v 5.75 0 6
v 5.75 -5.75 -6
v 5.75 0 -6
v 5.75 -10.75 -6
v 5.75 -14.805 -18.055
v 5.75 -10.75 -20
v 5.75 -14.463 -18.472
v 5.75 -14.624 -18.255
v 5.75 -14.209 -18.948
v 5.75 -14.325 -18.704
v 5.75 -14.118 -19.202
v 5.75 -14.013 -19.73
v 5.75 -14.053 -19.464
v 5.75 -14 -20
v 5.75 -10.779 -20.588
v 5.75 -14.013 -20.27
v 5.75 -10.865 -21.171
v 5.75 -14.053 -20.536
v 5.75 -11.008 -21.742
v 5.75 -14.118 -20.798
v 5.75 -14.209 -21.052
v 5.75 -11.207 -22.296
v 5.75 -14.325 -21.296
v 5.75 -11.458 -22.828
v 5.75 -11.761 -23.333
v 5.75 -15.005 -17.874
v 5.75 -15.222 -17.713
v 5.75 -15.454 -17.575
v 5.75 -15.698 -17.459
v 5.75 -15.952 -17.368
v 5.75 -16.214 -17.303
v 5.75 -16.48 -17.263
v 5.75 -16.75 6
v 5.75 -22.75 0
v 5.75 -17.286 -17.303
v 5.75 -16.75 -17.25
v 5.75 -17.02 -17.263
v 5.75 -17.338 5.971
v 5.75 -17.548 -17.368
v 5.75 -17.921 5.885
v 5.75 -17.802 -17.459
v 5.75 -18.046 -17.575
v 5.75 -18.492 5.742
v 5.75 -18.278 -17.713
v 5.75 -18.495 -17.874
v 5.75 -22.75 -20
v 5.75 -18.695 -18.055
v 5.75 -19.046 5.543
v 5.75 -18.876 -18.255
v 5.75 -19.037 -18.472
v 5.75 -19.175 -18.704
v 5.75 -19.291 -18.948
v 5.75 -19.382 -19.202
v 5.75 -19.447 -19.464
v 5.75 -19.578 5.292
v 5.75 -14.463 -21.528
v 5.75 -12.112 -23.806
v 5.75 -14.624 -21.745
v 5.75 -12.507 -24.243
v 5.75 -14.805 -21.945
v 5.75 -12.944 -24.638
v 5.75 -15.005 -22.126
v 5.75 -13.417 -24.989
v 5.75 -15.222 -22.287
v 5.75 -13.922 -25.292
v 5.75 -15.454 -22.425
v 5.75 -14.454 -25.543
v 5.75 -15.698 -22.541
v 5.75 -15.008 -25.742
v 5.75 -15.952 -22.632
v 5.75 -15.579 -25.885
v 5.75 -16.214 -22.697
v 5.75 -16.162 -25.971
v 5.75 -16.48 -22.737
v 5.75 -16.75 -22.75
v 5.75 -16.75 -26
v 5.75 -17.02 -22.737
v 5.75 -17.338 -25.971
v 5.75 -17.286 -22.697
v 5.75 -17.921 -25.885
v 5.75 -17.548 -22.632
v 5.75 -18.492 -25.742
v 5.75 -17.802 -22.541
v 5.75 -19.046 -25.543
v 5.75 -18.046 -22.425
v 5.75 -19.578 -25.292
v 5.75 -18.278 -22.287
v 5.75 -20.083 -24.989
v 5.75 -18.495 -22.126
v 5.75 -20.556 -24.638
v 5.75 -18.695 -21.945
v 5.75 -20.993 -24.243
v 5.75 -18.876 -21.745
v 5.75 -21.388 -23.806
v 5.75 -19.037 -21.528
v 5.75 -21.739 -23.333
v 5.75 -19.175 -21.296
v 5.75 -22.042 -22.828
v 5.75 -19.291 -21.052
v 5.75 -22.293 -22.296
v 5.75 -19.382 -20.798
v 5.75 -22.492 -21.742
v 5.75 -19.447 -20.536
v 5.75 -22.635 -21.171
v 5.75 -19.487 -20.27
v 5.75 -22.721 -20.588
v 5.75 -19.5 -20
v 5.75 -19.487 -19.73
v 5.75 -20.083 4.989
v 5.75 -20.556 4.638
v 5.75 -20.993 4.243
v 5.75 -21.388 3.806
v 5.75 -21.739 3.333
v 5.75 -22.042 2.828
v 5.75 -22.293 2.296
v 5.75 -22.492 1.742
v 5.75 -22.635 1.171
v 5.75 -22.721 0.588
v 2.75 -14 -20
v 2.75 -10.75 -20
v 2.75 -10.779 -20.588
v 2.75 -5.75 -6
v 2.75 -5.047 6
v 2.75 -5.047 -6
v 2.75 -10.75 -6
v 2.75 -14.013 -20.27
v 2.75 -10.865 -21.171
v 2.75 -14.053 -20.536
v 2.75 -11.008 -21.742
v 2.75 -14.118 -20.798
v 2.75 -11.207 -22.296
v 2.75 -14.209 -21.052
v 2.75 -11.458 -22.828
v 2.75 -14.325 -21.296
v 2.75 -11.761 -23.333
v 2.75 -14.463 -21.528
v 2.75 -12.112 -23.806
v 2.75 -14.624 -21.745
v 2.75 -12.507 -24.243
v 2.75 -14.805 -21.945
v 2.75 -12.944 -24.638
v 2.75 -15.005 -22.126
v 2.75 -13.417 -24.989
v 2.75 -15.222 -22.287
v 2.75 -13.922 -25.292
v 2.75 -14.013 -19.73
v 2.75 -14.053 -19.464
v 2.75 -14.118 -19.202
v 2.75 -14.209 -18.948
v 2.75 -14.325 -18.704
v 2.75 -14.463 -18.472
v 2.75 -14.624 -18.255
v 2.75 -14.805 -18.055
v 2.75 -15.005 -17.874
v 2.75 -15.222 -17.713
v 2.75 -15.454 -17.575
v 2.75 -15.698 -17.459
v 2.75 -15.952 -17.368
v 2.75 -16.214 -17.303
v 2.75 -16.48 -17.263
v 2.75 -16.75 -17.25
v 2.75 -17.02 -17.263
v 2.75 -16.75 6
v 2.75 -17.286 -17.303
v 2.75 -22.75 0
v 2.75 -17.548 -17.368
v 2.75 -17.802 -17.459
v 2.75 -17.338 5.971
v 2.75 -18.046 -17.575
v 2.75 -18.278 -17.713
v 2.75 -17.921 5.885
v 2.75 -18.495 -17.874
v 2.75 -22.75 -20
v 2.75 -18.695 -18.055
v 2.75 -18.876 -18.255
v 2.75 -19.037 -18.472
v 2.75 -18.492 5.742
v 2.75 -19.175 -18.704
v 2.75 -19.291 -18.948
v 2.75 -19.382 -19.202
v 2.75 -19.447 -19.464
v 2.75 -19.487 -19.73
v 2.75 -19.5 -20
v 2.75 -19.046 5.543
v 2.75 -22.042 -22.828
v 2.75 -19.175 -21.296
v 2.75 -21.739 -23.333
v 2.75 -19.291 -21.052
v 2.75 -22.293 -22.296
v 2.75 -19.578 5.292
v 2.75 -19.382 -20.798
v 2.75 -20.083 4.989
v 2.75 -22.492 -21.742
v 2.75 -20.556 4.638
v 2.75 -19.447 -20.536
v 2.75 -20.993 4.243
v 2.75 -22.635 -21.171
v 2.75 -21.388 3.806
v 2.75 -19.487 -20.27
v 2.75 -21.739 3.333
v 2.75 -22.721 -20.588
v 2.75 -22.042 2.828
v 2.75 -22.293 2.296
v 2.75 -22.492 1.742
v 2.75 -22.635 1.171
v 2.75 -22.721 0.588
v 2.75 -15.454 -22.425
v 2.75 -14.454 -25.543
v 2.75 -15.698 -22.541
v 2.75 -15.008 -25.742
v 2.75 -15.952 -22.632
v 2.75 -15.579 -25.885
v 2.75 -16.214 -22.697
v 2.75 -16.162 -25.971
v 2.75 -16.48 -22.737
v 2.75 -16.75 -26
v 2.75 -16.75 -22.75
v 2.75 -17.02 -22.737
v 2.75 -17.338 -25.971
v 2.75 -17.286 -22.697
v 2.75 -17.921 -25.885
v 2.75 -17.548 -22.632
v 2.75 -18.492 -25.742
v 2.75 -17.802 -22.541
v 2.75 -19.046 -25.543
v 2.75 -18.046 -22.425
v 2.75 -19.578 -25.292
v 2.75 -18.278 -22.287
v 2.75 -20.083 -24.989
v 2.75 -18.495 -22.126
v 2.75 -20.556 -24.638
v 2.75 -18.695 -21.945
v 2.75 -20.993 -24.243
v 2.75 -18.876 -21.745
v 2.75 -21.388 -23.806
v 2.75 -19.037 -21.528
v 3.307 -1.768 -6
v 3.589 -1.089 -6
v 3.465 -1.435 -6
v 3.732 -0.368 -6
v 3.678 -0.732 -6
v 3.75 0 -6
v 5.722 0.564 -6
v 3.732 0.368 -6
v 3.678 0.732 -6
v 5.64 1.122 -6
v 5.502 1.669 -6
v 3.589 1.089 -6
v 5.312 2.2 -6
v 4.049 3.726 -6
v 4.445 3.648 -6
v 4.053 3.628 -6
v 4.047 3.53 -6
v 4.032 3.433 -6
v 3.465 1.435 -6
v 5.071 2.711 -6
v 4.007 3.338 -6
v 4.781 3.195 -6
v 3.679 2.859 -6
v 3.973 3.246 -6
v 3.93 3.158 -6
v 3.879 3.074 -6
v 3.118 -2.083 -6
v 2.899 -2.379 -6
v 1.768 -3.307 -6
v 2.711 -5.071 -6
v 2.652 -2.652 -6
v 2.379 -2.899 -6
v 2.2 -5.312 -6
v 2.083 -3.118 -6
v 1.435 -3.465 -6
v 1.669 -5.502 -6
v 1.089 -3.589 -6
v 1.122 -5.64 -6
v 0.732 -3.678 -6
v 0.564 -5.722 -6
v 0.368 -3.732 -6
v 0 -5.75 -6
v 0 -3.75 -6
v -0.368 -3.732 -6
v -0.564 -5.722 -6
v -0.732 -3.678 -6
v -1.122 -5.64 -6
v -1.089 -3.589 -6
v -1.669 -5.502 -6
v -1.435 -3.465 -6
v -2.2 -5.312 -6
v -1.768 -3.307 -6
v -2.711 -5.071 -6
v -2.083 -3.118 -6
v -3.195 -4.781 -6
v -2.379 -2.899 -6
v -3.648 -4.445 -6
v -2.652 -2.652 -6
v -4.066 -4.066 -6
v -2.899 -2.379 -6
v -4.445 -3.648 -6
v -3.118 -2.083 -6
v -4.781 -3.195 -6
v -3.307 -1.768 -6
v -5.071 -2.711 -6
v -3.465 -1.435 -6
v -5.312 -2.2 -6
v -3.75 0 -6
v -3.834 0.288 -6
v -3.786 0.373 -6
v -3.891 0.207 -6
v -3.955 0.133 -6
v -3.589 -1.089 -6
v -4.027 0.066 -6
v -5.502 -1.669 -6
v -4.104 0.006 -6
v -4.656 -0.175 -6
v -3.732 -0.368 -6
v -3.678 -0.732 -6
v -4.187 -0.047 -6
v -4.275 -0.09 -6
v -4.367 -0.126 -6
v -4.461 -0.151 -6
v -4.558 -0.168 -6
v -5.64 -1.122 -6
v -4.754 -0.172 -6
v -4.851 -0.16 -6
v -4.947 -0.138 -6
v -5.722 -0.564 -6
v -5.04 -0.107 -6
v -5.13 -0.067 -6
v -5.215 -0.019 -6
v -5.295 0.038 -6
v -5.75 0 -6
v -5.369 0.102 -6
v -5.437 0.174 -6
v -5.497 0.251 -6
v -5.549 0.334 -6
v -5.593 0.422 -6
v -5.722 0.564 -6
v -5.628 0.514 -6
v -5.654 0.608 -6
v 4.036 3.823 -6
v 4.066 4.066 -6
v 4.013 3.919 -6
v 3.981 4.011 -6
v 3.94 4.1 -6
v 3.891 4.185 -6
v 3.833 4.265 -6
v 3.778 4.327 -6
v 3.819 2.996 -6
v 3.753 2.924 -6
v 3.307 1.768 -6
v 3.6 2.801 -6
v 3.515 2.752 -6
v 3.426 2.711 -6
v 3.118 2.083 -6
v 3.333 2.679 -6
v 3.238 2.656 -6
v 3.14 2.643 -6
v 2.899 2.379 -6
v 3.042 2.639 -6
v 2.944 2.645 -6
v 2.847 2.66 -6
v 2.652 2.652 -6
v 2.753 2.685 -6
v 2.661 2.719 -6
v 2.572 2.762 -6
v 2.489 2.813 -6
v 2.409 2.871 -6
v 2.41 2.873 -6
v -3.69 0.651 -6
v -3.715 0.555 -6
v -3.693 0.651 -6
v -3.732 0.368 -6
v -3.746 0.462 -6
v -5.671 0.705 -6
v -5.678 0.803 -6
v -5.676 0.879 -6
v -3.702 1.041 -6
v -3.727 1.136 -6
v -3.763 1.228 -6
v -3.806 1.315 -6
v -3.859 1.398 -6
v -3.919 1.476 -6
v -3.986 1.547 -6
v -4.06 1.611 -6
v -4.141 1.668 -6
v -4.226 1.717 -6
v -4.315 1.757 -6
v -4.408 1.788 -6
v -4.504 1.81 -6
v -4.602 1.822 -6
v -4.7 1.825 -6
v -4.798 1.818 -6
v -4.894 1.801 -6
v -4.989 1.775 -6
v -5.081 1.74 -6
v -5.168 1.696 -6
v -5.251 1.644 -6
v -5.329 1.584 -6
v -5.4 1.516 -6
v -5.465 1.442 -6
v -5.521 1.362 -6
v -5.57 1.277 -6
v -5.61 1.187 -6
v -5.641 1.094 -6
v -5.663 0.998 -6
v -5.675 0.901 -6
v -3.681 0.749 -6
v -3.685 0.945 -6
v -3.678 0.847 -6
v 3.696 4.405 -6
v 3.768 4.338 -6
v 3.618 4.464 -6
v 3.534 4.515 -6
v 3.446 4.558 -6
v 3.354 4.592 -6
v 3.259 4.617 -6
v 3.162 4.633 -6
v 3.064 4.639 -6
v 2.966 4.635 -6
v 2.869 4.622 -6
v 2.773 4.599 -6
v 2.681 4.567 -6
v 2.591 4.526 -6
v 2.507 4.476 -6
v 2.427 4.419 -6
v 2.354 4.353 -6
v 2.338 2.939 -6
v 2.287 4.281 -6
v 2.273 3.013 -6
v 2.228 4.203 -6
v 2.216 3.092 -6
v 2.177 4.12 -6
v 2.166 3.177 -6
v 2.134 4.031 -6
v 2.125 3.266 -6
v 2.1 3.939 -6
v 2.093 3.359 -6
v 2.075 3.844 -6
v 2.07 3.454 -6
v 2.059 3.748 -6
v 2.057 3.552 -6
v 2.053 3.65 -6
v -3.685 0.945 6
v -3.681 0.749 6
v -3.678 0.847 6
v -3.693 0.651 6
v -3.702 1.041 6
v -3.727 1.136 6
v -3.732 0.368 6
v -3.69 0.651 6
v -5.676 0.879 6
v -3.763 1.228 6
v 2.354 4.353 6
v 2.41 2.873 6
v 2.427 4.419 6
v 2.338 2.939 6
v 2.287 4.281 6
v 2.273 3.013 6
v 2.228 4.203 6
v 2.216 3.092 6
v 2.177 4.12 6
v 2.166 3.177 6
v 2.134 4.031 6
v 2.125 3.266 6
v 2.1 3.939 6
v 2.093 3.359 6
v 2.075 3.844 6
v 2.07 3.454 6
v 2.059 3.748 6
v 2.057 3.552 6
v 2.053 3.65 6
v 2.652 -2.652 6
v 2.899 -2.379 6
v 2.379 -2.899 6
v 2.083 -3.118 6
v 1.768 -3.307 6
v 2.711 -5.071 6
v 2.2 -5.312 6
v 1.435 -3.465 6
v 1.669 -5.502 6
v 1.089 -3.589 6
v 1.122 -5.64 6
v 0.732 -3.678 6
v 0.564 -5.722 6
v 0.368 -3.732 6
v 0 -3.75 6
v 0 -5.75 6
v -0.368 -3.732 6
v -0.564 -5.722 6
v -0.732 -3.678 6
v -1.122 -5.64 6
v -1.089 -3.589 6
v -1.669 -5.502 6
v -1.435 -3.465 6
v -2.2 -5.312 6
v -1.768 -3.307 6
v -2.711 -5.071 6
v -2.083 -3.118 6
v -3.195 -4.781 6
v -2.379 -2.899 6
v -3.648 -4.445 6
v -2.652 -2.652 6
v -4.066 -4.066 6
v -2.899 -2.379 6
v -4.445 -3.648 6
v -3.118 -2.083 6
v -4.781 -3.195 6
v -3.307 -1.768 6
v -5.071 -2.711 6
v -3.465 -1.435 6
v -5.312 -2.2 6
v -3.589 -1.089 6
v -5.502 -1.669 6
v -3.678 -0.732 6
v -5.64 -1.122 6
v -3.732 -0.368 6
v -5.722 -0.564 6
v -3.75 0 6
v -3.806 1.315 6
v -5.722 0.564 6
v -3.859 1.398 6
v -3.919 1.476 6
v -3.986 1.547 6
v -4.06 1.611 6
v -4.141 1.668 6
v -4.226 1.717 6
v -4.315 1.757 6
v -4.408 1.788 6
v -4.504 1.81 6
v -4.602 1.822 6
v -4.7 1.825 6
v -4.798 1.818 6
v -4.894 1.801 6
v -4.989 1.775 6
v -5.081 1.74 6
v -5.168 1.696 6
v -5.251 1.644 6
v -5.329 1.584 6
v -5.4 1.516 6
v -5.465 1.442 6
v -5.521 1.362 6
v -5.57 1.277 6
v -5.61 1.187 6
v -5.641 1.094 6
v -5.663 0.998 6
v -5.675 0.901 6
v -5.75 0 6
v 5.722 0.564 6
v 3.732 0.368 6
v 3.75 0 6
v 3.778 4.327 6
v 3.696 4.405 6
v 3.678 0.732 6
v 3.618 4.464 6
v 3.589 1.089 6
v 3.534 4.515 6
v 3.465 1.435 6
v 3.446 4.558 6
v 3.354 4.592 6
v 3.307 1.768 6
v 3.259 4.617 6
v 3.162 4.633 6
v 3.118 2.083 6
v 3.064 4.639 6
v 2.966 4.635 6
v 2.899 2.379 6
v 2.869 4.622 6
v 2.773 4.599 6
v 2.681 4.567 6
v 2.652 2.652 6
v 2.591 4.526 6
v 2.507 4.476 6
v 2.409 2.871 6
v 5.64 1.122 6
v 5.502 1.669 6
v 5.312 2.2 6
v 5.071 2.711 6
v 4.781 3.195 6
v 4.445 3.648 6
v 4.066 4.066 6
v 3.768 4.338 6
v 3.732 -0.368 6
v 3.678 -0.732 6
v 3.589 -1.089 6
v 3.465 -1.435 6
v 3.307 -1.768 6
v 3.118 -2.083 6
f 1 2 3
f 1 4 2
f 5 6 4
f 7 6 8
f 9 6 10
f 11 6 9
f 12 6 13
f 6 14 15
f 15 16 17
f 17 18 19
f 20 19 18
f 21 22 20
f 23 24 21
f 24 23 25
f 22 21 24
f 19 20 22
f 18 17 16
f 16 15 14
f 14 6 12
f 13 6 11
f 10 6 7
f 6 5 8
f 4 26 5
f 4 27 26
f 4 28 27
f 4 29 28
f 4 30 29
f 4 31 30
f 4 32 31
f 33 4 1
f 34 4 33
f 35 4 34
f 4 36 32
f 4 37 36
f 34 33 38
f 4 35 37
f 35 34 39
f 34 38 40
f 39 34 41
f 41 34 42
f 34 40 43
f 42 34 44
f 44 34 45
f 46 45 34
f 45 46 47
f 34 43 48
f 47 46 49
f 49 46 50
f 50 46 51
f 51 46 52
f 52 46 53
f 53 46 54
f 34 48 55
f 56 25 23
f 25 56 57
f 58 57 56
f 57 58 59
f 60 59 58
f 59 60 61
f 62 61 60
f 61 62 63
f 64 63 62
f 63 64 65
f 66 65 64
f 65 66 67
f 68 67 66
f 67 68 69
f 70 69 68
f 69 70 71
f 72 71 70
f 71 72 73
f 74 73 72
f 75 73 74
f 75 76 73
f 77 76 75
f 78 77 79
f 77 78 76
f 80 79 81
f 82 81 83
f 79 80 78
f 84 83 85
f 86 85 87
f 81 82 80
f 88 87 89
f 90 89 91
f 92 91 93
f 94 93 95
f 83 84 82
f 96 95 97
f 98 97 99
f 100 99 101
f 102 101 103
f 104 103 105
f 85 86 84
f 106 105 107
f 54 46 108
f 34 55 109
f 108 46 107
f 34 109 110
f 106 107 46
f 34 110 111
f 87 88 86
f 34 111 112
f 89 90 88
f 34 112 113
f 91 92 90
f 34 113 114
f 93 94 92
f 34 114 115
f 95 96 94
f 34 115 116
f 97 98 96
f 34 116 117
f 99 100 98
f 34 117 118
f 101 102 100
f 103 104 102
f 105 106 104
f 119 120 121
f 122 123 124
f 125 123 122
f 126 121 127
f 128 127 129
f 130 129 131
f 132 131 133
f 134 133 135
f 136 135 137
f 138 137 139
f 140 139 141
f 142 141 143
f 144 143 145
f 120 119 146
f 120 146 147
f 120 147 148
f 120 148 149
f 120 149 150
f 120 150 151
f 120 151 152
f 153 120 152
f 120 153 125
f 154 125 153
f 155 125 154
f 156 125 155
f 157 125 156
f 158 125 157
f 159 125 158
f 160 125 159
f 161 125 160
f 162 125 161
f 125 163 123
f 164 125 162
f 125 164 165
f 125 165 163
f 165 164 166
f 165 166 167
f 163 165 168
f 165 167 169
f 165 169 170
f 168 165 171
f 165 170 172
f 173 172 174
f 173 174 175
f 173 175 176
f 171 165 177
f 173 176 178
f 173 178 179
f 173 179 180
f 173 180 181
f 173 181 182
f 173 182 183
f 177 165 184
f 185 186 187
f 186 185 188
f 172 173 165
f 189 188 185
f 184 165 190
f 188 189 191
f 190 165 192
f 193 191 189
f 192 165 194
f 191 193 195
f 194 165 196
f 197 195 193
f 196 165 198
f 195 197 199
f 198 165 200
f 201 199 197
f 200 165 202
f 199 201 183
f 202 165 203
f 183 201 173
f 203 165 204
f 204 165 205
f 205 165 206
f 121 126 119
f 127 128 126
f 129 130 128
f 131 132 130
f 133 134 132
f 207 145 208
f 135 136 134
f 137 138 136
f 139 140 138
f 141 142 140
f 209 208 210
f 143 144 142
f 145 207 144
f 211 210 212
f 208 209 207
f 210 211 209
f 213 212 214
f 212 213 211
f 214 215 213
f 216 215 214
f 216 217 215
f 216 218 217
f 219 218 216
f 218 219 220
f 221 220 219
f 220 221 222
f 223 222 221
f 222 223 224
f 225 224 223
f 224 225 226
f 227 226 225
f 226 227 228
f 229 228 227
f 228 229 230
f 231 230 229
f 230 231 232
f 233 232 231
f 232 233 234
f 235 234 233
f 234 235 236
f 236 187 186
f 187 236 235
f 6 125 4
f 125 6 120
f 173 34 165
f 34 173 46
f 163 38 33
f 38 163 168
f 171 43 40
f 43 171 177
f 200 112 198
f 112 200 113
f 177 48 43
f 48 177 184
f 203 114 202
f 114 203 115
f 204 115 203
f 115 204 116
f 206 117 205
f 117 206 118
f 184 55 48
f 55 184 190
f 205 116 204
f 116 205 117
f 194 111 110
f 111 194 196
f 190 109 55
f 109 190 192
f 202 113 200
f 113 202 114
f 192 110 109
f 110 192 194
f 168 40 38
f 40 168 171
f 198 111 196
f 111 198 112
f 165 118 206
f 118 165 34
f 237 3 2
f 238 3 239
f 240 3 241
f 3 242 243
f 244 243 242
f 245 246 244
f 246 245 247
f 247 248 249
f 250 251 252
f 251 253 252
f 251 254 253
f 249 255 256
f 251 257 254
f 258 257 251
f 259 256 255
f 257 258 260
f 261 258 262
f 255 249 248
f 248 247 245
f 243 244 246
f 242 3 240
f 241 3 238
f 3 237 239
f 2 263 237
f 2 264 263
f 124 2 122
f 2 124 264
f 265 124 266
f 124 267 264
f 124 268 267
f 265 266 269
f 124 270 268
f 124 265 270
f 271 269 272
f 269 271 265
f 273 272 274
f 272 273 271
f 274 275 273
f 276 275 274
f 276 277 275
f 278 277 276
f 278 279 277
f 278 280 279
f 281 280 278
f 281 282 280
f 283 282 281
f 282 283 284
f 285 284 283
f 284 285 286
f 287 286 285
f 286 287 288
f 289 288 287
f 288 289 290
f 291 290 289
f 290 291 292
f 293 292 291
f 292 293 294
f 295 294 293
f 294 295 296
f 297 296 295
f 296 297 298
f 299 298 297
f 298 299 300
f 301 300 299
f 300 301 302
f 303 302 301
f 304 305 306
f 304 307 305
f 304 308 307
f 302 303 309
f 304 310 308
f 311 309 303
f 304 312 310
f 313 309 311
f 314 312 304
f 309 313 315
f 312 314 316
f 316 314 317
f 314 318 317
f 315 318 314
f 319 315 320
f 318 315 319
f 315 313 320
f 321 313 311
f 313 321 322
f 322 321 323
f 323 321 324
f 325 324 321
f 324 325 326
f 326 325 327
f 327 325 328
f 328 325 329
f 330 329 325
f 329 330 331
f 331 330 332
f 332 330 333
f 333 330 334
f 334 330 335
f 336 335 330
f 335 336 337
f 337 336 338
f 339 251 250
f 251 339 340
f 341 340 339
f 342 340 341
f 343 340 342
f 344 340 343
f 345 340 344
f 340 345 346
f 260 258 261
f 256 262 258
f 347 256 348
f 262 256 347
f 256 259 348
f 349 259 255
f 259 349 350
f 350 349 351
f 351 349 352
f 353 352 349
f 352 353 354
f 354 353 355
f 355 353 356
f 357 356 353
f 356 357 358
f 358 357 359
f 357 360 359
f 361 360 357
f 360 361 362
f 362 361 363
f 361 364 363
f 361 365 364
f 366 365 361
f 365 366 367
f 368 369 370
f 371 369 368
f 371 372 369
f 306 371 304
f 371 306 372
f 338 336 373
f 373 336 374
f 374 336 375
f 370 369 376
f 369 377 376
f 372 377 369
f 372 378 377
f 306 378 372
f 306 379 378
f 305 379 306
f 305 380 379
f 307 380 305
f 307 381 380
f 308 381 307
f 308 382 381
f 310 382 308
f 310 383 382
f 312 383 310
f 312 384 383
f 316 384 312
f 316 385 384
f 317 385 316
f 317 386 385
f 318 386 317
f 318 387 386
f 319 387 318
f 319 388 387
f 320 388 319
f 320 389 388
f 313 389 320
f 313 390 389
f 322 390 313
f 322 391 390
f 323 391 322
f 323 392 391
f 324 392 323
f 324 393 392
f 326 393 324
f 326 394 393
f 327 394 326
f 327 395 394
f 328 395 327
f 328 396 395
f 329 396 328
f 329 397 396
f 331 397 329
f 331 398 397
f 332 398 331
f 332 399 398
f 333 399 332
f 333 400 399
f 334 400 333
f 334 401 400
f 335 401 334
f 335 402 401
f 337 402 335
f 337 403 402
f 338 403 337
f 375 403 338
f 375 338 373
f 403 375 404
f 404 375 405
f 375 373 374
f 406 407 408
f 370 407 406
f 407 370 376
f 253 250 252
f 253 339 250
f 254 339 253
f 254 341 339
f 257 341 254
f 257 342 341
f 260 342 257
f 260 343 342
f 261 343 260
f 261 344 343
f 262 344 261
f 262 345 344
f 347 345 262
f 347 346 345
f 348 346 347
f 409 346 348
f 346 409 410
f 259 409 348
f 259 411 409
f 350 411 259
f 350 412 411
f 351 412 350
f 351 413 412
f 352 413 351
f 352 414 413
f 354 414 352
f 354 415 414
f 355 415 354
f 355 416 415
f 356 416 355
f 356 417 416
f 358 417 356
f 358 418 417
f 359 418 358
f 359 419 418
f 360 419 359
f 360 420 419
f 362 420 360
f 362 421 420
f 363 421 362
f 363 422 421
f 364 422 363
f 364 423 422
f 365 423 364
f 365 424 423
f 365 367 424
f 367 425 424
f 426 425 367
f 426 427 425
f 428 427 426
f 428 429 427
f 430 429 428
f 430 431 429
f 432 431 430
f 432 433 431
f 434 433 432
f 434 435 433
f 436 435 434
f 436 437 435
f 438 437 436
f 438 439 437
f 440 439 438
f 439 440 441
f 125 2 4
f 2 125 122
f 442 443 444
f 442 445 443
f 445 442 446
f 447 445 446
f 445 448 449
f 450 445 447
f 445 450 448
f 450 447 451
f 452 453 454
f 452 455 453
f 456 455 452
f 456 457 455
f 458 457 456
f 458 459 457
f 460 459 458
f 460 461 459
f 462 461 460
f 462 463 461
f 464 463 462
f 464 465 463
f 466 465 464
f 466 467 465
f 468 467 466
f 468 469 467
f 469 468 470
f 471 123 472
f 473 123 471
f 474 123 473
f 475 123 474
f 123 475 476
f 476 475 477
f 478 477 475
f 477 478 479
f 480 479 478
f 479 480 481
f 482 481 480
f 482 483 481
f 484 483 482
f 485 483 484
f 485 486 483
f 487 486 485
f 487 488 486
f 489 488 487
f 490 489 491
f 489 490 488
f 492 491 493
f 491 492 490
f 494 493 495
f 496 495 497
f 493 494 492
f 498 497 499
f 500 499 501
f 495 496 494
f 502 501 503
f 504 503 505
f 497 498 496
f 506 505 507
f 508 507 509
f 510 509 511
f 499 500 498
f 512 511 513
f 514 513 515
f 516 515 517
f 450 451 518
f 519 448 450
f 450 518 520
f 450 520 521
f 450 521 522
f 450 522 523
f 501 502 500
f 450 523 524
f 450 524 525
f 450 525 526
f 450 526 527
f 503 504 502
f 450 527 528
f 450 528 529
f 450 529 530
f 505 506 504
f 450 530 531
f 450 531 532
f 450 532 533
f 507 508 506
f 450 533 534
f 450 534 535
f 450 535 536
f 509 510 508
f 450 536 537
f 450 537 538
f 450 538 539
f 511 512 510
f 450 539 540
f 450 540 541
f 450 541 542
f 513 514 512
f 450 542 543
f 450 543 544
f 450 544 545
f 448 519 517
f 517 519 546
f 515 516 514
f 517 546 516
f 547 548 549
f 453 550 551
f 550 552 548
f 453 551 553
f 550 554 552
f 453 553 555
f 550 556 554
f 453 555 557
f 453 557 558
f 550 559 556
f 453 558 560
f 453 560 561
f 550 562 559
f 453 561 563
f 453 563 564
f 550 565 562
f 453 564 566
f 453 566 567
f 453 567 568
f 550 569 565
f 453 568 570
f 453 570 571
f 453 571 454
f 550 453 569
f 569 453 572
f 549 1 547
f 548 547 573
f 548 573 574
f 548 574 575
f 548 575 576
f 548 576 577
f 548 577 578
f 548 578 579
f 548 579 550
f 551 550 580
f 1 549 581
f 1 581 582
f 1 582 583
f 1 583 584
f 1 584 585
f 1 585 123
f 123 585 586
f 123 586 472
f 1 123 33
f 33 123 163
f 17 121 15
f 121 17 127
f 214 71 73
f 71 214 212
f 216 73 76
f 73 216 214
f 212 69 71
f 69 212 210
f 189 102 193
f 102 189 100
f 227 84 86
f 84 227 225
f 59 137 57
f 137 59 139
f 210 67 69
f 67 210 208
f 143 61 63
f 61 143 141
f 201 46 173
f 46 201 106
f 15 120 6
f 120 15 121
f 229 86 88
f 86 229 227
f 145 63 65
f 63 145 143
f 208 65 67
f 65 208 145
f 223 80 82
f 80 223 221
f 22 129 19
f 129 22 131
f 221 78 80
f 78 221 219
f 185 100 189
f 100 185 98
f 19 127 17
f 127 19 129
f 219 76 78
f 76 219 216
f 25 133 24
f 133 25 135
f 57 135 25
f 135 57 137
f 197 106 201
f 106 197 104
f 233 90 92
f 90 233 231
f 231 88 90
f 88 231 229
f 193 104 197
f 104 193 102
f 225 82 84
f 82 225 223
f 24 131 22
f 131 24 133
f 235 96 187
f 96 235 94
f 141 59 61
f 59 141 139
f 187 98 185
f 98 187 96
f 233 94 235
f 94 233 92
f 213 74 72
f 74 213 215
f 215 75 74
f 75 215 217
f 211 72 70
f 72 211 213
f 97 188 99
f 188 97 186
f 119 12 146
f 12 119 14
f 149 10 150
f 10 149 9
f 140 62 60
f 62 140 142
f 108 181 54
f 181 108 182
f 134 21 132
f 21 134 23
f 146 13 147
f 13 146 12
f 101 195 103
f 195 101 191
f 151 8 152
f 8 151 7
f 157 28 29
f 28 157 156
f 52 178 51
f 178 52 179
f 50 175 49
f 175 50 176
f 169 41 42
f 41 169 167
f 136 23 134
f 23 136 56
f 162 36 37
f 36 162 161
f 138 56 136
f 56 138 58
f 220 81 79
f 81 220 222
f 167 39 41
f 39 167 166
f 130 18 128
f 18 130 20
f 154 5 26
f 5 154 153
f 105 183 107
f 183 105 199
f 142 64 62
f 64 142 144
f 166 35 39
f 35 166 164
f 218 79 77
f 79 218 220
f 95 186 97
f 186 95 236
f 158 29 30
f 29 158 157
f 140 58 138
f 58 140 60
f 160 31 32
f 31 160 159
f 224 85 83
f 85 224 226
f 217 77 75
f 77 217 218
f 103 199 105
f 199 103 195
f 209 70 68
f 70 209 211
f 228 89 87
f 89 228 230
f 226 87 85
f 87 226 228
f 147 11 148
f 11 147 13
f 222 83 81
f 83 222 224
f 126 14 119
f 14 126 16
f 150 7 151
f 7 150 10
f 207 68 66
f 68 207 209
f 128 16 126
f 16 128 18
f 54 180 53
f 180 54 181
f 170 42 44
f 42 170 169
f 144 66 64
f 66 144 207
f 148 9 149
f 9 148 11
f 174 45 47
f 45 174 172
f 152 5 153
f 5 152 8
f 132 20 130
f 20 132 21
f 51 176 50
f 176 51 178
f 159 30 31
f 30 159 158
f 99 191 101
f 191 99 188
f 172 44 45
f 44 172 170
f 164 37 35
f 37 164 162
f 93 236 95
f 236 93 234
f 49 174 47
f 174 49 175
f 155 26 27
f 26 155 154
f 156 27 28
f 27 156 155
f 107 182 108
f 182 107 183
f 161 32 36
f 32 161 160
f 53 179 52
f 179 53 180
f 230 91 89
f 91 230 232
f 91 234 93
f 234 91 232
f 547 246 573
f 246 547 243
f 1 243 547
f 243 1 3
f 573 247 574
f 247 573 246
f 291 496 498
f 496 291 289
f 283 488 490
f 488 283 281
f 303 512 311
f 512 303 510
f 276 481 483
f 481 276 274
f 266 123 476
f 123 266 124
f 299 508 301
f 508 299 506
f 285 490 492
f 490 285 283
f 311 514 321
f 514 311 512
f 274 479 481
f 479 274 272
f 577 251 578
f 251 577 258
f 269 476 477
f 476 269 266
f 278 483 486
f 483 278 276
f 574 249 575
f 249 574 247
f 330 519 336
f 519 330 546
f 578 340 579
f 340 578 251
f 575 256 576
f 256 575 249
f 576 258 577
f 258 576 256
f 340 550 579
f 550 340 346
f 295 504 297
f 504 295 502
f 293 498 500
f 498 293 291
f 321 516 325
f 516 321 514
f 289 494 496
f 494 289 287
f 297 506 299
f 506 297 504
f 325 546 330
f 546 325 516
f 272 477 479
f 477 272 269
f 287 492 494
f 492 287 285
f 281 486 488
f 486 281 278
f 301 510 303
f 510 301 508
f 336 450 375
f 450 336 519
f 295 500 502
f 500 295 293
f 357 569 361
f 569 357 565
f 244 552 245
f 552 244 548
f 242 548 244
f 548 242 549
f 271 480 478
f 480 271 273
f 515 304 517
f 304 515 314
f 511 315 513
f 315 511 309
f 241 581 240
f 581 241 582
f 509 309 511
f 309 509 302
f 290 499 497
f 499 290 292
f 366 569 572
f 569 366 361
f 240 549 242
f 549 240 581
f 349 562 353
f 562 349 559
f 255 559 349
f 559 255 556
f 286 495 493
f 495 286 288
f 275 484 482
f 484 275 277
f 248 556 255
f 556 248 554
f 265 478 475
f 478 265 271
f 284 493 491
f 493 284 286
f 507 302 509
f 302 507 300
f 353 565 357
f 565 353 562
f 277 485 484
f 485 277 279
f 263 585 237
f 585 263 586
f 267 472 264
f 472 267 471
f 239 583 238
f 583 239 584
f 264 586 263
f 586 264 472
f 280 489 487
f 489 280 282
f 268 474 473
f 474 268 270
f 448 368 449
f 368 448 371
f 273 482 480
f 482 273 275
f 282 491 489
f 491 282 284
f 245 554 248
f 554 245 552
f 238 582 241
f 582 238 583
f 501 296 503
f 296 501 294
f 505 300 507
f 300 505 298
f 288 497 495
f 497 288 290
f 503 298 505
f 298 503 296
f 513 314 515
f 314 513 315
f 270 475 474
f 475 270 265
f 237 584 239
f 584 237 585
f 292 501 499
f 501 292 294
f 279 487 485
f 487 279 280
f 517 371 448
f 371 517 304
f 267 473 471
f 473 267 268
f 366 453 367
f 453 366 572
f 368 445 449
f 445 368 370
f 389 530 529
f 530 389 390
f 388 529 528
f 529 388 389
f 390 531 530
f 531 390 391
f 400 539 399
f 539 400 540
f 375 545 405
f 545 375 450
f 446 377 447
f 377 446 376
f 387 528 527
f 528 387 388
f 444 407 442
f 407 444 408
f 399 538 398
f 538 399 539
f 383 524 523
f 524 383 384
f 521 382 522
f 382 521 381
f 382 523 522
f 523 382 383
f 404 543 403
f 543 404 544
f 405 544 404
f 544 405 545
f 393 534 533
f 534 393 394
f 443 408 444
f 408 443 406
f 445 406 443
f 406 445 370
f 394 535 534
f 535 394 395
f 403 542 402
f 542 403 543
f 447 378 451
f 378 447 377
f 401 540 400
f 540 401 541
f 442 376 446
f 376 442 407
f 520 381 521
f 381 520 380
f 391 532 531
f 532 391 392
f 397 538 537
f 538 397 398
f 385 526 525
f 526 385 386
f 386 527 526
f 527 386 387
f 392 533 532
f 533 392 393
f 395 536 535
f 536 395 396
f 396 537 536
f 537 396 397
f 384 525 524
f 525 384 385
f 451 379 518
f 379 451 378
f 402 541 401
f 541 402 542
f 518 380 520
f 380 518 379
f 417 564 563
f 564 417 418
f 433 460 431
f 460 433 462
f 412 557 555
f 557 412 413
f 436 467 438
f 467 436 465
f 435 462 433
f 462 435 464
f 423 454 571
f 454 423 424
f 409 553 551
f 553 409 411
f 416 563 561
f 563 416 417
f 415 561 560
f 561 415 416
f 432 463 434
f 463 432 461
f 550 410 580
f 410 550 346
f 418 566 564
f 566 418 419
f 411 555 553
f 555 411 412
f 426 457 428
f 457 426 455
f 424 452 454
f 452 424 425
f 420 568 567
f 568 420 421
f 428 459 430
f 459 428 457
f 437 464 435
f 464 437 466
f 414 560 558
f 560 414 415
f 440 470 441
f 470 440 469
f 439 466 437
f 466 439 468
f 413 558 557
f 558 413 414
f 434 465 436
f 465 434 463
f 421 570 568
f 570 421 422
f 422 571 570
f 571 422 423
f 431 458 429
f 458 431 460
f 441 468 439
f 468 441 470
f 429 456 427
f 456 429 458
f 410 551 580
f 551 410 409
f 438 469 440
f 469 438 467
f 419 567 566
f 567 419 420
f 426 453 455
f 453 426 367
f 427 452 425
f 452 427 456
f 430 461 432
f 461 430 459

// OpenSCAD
// Customizable cable clip
// by Frederic RIBLE F1OAT / 2018/11/05
// remixed to Customizable  cable-clamp
// by Marc Hoppe 2018/11/21

cables_count = 1; // [1:10]

// (in mm)
cables_diameter = 7.5;

// (in mm)
cables_spacing = 0;

// (in mm)
thickness = 2;

// (in mm)
gap = -1;

// (in mm)
width = 12;

// (in mm)
screw_diameter = 5.5;

// length y-axis
len=5;
// (in mm) z-axis offset
d=20;

// 1: clamp, 0: clip
clamp=1;


// Following variables are not parameters -----------------

epsilon = 0.1+0;
$fn=64+0;

outer = cables_diameter+2*thickness;

if(clamp==1) clamp();
else         cip();


module clamp() {
    difference() {
    clip();
    translate([0,0,-10]) rotate([0,0,50]) rotate_extrude(angle=120)
        square([width*2,width*2]);
    }
    rotate([0,0,80]) translate([0,(cables_diameter+thickness)/2,0])
        cylinder(h=width, d=thickness, center=true);
    rotate([0,0,-40]) translate([0,(cables_diameter+thickness)/2,0])
        cylinder(h=width, d=thickness, center=true);
}


module clip() {
    difference() {
        union() {
            for (c=[0:cables_count-1]) {
                translate([0,c*(cables_diameter+cables_spacing),0]) {
                    cylinder(h=width, d=outer, center=true);
                }
            }
            translate([outer/2-thickness-gap/2, -width/2-outer/2, 0]) {
                rotate([0, 90, 0]) {
                    bracket(len,d);
                }
            }
        }
        cut = width+outer/2;
        #translate([outer/2-thickness, -cut-epsilon-len, -width/2-epsilon-d]) {
            rotate([0, -90, 0]) {
                cube([width+2*epsilon+d, cut+2*epsilon+len, gap]);
            }
        }
        for (c=[0:cables_count-1]) {
            translate([0,c*(cables_diameter+cables_spacing),0]) {
                cylinder(h=width+epsilon+d, d=cables_diameter, center=true);
            }
            translate([0,c*(cables_diameter+cables_spacing),-d/2-width]) {
                cube([cables_diameter+thickness*3, cables_diameter+thickness*2, d+width], center=true);
            }
        }
        ll = (cables_count-1)*(cables_diameter+cables_spacing);
        translate([0,ll/2,0]) {
            cube([cables_diameter*0.6, ll, width+2*epsilon], center=true);
        }
    }
}

module bracket(len=0, d=0) {
    len2=len+(width/2+outer/2);
    dy=-(len2-(width/2+outer/2));
    translate([d,dy,0])
    difference() {
        union() {
            translate([-d, -width/2, -thickness-gap/2]) {
                cube([abs(d) ,width, 2*thickness+gap]);
            }
            translate([-d, 0, 0]) {
            cylinder(h=2*thickness+gap, d=width, center=true);
            }
            translate([-width/2-d, 0, -thickness-gap/2]) {
                cube([width, len2, 2*thickness+gap]);
            }
            cylinder(h=2*thickness+gap, d=width, center=true);
        }
        cylinder(h=2*thickness+gap+2*epsilon, d=screw_diameter, center=true);
    }
}
